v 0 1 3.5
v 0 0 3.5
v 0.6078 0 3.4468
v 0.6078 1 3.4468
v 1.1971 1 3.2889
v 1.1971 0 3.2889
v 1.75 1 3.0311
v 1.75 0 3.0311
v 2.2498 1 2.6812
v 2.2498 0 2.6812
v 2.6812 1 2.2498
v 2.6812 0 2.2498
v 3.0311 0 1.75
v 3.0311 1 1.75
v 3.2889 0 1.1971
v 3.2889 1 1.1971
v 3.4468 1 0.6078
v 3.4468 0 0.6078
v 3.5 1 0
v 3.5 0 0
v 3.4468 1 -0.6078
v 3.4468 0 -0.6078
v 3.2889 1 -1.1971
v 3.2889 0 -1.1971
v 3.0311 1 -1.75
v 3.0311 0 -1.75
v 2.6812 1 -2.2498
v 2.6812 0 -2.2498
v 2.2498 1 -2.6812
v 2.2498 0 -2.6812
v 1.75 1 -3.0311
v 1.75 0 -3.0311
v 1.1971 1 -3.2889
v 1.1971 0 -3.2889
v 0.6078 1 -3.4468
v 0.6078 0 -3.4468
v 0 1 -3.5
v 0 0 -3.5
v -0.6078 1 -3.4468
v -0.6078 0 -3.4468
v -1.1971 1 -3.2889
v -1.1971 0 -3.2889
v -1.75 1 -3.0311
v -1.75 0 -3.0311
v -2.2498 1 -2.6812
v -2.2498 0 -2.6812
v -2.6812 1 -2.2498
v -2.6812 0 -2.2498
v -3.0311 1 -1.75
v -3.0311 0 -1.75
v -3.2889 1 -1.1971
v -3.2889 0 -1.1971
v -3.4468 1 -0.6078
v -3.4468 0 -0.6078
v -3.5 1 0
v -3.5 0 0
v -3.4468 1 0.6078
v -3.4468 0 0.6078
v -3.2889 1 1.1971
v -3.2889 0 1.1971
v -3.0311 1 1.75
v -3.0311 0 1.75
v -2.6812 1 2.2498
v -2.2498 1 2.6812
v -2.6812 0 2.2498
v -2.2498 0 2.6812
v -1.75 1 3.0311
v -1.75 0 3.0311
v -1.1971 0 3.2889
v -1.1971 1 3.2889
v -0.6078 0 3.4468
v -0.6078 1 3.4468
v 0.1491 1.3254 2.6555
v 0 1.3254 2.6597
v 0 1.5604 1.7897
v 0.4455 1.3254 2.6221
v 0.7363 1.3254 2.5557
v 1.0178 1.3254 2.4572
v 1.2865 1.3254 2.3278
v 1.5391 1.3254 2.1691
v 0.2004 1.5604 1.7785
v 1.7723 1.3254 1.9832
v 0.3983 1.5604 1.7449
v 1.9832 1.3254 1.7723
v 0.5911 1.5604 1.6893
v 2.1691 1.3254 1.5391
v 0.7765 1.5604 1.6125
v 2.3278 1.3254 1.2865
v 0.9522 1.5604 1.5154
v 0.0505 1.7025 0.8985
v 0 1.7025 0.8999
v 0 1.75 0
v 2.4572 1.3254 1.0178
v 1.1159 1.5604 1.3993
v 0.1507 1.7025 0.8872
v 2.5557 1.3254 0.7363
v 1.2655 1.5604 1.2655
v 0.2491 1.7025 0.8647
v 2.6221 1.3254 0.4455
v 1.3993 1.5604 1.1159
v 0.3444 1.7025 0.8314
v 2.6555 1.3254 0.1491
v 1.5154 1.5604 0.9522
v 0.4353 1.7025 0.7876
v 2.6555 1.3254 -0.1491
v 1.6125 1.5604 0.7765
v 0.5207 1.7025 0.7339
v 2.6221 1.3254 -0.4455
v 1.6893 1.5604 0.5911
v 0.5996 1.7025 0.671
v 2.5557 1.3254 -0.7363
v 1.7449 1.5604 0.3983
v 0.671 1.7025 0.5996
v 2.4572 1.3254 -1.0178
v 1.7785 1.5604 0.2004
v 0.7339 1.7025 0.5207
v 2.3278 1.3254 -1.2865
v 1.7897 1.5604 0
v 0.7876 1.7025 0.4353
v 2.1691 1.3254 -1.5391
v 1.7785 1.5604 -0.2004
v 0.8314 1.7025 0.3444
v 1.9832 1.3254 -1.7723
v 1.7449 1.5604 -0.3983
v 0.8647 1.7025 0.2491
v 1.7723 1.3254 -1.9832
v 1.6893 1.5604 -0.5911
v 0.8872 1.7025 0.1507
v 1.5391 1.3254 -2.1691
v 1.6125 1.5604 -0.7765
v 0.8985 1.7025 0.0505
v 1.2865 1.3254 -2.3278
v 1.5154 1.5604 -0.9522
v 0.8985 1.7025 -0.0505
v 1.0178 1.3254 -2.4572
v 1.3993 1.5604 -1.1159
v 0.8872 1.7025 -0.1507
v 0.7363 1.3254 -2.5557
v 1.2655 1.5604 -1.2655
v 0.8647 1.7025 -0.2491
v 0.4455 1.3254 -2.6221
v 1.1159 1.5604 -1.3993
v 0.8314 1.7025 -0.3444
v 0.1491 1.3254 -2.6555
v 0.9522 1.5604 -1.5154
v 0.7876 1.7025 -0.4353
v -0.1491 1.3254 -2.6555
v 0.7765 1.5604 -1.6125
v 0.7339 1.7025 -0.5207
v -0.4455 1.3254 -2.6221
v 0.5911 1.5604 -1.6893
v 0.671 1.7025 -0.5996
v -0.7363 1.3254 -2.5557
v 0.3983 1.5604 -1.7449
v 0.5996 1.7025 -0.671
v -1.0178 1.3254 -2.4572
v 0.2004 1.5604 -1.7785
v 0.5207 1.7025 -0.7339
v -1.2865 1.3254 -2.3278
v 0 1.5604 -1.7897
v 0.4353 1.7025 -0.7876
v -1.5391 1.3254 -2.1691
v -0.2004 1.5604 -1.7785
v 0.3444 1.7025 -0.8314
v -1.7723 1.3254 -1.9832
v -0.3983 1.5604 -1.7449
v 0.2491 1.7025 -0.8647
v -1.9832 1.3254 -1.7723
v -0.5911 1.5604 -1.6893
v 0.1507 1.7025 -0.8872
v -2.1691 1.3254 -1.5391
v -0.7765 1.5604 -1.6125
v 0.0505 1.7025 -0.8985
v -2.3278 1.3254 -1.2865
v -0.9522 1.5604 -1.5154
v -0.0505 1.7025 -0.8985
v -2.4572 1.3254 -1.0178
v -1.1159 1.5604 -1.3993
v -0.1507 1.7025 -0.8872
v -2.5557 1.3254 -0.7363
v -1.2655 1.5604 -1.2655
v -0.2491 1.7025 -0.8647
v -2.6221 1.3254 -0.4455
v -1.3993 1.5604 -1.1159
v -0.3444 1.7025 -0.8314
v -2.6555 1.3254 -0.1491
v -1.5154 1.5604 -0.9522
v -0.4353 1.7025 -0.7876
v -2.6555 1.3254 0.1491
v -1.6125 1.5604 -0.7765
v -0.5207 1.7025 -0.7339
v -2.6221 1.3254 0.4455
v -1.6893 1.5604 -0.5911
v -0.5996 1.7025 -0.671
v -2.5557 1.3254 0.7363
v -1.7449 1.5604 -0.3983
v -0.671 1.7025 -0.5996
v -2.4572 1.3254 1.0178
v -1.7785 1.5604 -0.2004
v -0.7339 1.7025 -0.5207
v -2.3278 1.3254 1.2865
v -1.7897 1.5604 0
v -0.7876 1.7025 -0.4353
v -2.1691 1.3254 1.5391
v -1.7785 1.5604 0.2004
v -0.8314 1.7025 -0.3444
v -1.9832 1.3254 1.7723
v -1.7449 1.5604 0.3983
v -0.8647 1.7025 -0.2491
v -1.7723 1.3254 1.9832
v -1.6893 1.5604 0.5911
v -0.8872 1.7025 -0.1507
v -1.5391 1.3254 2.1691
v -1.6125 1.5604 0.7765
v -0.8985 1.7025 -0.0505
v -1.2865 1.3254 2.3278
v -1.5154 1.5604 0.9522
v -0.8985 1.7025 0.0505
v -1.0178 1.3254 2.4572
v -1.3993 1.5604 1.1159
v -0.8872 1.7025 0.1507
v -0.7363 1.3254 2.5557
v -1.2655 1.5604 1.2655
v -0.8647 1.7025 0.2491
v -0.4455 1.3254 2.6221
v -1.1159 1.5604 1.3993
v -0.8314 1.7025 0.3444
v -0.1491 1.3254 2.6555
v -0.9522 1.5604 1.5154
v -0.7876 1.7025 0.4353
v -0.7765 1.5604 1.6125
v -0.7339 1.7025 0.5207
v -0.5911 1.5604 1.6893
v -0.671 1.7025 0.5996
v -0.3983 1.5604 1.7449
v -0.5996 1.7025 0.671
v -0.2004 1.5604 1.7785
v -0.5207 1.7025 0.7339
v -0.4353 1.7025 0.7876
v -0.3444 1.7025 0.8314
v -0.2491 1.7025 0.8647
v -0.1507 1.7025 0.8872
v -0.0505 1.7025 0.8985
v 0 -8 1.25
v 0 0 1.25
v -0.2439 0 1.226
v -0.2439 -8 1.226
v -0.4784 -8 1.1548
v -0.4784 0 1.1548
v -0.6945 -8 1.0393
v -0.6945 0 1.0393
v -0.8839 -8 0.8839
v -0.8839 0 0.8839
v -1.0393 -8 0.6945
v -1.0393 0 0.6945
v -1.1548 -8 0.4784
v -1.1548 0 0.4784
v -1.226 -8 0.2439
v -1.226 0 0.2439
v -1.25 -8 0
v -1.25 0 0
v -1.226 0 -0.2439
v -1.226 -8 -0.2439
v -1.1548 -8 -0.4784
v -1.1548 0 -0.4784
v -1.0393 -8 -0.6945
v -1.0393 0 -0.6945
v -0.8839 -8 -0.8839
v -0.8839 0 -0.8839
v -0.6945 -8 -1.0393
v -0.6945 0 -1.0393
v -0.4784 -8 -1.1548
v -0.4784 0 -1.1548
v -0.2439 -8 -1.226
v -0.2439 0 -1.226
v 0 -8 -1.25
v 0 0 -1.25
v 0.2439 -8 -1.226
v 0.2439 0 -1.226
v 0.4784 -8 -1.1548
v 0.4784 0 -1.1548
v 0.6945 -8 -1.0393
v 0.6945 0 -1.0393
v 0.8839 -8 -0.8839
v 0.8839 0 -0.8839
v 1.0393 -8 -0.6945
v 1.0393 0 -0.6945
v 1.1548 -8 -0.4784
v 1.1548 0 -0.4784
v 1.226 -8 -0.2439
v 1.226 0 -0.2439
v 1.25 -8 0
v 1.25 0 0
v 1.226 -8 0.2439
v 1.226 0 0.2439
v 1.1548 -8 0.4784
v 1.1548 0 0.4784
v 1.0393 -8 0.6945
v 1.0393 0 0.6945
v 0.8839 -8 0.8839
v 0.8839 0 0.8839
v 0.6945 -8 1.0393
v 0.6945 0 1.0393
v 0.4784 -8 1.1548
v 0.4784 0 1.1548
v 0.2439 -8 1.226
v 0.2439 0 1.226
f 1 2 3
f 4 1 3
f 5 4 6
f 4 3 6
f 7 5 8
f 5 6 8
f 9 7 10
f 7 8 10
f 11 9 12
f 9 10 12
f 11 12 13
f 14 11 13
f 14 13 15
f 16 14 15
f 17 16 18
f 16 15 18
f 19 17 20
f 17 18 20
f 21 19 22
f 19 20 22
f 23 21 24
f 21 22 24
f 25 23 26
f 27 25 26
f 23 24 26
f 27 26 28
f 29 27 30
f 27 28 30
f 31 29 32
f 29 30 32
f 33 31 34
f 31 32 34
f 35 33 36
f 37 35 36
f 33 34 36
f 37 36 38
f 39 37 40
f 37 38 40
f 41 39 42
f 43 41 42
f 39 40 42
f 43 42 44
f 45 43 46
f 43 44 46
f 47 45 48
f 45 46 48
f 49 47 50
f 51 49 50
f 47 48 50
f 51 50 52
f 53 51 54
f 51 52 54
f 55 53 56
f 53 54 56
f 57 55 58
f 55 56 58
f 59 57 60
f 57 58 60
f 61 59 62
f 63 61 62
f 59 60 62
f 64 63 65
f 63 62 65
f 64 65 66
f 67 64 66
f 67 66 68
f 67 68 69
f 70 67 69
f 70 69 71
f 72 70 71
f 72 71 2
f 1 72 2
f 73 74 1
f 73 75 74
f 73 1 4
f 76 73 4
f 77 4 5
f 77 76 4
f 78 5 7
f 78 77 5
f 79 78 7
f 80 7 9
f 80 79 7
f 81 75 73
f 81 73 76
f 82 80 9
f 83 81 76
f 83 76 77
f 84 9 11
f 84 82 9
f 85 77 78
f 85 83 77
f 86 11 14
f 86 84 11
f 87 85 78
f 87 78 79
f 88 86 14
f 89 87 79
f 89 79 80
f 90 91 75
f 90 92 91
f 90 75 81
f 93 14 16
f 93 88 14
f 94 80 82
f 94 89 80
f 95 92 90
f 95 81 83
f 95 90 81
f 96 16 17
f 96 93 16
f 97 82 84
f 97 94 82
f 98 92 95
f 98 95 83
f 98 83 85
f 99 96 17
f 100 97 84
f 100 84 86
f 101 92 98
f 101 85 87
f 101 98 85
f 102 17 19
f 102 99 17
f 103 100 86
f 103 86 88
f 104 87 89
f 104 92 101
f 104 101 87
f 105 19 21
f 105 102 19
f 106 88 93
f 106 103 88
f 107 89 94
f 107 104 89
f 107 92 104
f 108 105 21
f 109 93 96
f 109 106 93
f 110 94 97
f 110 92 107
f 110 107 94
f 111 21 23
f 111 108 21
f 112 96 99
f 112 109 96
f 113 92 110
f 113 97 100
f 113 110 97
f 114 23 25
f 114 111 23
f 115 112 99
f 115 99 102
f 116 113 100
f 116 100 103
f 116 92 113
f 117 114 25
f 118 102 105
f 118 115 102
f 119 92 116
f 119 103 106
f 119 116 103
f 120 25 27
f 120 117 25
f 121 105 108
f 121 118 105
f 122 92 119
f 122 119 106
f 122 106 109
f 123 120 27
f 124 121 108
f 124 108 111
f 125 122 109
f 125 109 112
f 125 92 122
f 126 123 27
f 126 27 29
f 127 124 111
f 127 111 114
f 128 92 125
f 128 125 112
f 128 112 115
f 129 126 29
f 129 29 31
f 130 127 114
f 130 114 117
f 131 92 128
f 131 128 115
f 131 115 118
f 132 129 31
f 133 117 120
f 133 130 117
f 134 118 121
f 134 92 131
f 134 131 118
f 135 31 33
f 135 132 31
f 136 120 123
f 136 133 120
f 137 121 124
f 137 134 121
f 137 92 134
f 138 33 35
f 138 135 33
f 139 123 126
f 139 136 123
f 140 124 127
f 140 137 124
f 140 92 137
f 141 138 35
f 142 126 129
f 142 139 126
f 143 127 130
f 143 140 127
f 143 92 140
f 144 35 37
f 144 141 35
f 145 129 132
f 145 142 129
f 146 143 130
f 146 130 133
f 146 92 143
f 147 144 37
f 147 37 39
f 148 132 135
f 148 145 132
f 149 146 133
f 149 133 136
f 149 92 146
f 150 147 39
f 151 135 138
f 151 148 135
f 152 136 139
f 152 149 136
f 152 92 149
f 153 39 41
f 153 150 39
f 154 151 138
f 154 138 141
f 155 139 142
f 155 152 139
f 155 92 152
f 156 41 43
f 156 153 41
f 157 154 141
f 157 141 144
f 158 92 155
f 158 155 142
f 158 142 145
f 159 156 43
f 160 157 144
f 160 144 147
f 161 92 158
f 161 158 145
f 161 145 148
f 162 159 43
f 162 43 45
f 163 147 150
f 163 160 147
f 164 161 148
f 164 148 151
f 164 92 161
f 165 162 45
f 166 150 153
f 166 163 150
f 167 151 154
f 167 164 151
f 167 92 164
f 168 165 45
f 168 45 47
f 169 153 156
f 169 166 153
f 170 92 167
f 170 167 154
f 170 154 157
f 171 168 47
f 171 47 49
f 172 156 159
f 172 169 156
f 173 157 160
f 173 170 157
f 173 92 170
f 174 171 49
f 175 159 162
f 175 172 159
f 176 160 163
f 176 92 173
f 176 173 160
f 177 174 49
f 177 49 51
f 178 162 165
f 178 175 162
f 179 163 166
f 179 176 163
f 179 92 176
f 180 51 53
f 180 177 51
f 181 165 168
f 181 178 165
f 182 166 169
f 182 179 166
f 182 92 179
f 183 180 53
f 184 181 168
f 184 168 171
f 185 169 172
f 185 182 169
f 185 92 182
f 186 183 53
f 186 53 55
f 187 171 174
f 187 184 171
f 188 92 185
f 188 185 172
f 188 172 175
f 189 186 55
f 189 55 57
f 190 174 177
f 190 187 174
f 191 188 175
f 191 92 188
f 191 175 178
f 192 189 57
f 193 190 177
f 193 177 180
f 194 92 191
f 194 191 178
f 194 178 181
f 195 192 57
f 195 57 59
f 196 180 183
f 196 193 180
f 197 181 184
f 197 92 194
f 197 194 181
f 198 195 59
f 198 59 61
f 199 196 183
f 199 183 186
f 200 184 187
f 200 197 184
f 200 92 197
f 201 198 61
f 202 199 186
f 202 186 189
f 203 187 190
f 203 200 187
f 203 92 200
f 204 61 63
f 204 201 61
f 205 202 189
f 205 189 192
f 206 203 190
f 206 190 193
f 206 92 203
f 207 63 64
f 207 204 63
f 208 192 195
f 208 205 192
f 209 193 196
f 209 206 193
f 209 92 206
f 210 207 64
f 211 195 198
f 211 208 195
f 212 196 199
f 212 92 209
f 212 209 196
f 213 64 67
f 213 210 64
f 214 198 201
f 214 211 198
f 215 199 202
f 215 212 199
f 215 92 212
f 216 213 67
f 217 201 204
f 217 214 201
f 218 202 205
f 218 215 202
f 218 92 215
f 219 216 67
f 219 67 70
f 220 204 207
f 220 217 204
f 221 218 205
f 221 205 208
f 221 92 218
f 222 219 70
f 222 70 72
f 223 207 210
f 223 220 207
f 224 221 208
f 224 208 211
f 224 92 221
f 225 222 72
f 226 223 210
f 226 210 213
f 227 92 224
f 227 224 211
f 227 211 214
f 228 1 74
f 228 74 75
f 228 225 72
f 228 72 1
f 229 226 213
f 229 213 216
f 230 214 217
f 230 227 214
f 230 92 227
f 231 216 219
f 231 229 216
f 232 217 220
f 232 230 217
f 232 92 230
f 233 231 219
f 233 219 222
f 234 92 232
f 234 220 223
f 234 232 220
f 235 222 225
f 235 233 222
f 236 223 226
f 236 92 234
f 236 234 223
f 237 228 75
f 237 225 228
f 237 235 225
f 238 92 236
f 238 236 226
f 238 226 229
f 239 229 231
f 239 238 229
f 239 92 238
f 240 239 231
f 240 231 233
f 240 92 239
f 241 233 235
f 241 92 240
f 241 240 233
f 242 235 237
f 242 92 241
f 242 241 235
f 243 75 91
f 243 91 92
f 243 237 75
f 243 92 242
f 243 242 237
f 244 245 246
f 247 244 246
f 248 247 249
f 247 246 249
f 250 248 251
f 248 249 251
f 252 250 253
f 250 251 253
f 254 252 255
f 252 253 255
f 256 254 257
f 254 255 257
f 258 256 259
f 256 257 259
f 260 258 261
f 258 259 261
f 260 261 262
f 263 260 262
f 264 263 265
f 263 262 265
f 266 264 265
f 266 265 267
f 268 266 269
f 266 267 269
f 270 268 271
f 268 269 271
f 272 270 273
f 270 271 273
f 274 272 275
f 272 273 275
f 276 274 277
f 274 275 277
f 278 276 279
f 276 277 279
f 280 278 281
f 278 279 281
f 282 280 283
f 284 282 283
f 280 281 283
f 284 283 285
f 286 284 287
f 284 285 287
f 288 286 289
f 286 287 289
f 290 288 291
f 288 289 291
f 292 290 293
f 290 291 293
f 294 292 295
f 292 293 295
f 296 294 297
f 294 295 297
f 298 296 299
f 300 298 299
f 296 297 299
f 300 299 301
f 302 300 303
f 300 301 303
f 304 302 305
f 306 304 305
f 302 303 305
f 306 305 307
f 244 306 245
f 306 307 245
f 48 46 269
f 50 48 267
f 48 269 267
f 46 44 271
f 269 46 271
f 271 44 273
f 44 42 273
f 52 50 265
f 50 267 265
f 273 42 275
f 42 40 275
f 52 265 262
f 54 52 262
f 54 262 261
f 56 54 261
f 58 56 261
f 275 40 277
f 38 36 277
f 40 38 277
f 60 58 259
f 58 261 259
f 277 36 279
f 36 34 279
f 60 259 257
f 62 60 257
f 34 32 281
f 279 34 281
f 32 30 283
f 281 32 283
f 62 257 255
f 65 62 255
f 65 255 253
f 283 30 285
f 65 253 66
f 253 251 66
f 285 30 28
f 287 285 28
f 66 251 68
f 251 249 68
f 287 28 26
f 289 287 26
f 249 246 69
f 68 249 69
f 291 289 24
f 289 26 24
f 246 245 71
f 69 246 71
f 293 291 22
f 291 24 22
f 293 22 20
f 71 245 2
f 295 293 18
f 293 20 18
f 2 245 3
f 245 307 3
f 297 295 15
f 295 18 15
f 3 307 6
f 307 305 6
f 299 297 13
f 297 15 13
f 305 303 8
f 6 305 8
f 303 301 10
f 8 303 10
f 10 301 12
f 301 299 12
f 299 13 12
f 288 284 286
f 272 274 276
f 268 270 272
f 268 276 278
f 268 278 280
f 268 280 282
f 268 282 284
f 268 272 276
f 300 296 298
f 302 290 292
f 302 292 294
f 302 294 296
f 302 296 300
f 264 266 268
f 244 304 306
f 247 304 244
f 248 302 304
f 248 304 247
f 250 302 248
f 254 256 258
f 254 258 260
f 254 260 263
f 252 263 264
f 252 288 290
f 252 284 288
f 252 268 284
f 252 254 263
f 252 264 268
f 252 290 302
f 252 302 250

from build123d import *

# Parameters (mm, degrees)
SKETCH1_R           = 3.5
BOSS_EXTRUDE1_DEPTH = 1
DOME1_FACE_RADIUS   = 3.5
DOME1_HEIGHT        = 0.75
SKETCH2_R           = 1.25
BOSS_EXTRUDE2_DEPTH = 8


with BuildPart() as part:
    # Sketch1 → Boss-Extrude1 (new body)
    with BuildSketch(Plane(origin=(0, 0, 0), x_dir=(1, 0, 0), z_dir=(0, 1, 0))):
        with Locations(Location((0, 0, 0), (0, 0, 270))):
            Circle(SKETCH1_R)
    extrude(amount=BOSS_EXTRUDE1_DEPTH)

    # Dome1: a dome of height H over a round flat face of radius A is a cap of a sphere of radius (A * A + H * H) / (2 * H)
    dome1_r = (DOME1_FACE_RADIUS * DOME1_FACE_RADIUS + DOME1_HEIGHT * DOME1_HEIGHT) / (2 * DOME1_HEIGHT)
    dome1_base = Plane((0, 1, 0), z_dir=(0, 1, 0))
    with Locations(dome1_base.offset(DOME1_HEIGHT - dome1_r)):
        dome1_ball = Sphere(dome1_r, mode=Mode.PRIVATE)
    add(split(dome1_ball, bisect_by=dome1_base, keep=Keep.TOP, mode=Mode.PRIVATE))

    # Sketch2 → Boss-Extrude2 (add)
    with BuildSketch(Plane.XZ):
        with Locations(Location((0, 0, 0), (0, 0, 90))):
            Circle(SKETCH2_R)
    extrude(amount=BOSS_EXTRUDE2_DEPTH)


solid = part.part
